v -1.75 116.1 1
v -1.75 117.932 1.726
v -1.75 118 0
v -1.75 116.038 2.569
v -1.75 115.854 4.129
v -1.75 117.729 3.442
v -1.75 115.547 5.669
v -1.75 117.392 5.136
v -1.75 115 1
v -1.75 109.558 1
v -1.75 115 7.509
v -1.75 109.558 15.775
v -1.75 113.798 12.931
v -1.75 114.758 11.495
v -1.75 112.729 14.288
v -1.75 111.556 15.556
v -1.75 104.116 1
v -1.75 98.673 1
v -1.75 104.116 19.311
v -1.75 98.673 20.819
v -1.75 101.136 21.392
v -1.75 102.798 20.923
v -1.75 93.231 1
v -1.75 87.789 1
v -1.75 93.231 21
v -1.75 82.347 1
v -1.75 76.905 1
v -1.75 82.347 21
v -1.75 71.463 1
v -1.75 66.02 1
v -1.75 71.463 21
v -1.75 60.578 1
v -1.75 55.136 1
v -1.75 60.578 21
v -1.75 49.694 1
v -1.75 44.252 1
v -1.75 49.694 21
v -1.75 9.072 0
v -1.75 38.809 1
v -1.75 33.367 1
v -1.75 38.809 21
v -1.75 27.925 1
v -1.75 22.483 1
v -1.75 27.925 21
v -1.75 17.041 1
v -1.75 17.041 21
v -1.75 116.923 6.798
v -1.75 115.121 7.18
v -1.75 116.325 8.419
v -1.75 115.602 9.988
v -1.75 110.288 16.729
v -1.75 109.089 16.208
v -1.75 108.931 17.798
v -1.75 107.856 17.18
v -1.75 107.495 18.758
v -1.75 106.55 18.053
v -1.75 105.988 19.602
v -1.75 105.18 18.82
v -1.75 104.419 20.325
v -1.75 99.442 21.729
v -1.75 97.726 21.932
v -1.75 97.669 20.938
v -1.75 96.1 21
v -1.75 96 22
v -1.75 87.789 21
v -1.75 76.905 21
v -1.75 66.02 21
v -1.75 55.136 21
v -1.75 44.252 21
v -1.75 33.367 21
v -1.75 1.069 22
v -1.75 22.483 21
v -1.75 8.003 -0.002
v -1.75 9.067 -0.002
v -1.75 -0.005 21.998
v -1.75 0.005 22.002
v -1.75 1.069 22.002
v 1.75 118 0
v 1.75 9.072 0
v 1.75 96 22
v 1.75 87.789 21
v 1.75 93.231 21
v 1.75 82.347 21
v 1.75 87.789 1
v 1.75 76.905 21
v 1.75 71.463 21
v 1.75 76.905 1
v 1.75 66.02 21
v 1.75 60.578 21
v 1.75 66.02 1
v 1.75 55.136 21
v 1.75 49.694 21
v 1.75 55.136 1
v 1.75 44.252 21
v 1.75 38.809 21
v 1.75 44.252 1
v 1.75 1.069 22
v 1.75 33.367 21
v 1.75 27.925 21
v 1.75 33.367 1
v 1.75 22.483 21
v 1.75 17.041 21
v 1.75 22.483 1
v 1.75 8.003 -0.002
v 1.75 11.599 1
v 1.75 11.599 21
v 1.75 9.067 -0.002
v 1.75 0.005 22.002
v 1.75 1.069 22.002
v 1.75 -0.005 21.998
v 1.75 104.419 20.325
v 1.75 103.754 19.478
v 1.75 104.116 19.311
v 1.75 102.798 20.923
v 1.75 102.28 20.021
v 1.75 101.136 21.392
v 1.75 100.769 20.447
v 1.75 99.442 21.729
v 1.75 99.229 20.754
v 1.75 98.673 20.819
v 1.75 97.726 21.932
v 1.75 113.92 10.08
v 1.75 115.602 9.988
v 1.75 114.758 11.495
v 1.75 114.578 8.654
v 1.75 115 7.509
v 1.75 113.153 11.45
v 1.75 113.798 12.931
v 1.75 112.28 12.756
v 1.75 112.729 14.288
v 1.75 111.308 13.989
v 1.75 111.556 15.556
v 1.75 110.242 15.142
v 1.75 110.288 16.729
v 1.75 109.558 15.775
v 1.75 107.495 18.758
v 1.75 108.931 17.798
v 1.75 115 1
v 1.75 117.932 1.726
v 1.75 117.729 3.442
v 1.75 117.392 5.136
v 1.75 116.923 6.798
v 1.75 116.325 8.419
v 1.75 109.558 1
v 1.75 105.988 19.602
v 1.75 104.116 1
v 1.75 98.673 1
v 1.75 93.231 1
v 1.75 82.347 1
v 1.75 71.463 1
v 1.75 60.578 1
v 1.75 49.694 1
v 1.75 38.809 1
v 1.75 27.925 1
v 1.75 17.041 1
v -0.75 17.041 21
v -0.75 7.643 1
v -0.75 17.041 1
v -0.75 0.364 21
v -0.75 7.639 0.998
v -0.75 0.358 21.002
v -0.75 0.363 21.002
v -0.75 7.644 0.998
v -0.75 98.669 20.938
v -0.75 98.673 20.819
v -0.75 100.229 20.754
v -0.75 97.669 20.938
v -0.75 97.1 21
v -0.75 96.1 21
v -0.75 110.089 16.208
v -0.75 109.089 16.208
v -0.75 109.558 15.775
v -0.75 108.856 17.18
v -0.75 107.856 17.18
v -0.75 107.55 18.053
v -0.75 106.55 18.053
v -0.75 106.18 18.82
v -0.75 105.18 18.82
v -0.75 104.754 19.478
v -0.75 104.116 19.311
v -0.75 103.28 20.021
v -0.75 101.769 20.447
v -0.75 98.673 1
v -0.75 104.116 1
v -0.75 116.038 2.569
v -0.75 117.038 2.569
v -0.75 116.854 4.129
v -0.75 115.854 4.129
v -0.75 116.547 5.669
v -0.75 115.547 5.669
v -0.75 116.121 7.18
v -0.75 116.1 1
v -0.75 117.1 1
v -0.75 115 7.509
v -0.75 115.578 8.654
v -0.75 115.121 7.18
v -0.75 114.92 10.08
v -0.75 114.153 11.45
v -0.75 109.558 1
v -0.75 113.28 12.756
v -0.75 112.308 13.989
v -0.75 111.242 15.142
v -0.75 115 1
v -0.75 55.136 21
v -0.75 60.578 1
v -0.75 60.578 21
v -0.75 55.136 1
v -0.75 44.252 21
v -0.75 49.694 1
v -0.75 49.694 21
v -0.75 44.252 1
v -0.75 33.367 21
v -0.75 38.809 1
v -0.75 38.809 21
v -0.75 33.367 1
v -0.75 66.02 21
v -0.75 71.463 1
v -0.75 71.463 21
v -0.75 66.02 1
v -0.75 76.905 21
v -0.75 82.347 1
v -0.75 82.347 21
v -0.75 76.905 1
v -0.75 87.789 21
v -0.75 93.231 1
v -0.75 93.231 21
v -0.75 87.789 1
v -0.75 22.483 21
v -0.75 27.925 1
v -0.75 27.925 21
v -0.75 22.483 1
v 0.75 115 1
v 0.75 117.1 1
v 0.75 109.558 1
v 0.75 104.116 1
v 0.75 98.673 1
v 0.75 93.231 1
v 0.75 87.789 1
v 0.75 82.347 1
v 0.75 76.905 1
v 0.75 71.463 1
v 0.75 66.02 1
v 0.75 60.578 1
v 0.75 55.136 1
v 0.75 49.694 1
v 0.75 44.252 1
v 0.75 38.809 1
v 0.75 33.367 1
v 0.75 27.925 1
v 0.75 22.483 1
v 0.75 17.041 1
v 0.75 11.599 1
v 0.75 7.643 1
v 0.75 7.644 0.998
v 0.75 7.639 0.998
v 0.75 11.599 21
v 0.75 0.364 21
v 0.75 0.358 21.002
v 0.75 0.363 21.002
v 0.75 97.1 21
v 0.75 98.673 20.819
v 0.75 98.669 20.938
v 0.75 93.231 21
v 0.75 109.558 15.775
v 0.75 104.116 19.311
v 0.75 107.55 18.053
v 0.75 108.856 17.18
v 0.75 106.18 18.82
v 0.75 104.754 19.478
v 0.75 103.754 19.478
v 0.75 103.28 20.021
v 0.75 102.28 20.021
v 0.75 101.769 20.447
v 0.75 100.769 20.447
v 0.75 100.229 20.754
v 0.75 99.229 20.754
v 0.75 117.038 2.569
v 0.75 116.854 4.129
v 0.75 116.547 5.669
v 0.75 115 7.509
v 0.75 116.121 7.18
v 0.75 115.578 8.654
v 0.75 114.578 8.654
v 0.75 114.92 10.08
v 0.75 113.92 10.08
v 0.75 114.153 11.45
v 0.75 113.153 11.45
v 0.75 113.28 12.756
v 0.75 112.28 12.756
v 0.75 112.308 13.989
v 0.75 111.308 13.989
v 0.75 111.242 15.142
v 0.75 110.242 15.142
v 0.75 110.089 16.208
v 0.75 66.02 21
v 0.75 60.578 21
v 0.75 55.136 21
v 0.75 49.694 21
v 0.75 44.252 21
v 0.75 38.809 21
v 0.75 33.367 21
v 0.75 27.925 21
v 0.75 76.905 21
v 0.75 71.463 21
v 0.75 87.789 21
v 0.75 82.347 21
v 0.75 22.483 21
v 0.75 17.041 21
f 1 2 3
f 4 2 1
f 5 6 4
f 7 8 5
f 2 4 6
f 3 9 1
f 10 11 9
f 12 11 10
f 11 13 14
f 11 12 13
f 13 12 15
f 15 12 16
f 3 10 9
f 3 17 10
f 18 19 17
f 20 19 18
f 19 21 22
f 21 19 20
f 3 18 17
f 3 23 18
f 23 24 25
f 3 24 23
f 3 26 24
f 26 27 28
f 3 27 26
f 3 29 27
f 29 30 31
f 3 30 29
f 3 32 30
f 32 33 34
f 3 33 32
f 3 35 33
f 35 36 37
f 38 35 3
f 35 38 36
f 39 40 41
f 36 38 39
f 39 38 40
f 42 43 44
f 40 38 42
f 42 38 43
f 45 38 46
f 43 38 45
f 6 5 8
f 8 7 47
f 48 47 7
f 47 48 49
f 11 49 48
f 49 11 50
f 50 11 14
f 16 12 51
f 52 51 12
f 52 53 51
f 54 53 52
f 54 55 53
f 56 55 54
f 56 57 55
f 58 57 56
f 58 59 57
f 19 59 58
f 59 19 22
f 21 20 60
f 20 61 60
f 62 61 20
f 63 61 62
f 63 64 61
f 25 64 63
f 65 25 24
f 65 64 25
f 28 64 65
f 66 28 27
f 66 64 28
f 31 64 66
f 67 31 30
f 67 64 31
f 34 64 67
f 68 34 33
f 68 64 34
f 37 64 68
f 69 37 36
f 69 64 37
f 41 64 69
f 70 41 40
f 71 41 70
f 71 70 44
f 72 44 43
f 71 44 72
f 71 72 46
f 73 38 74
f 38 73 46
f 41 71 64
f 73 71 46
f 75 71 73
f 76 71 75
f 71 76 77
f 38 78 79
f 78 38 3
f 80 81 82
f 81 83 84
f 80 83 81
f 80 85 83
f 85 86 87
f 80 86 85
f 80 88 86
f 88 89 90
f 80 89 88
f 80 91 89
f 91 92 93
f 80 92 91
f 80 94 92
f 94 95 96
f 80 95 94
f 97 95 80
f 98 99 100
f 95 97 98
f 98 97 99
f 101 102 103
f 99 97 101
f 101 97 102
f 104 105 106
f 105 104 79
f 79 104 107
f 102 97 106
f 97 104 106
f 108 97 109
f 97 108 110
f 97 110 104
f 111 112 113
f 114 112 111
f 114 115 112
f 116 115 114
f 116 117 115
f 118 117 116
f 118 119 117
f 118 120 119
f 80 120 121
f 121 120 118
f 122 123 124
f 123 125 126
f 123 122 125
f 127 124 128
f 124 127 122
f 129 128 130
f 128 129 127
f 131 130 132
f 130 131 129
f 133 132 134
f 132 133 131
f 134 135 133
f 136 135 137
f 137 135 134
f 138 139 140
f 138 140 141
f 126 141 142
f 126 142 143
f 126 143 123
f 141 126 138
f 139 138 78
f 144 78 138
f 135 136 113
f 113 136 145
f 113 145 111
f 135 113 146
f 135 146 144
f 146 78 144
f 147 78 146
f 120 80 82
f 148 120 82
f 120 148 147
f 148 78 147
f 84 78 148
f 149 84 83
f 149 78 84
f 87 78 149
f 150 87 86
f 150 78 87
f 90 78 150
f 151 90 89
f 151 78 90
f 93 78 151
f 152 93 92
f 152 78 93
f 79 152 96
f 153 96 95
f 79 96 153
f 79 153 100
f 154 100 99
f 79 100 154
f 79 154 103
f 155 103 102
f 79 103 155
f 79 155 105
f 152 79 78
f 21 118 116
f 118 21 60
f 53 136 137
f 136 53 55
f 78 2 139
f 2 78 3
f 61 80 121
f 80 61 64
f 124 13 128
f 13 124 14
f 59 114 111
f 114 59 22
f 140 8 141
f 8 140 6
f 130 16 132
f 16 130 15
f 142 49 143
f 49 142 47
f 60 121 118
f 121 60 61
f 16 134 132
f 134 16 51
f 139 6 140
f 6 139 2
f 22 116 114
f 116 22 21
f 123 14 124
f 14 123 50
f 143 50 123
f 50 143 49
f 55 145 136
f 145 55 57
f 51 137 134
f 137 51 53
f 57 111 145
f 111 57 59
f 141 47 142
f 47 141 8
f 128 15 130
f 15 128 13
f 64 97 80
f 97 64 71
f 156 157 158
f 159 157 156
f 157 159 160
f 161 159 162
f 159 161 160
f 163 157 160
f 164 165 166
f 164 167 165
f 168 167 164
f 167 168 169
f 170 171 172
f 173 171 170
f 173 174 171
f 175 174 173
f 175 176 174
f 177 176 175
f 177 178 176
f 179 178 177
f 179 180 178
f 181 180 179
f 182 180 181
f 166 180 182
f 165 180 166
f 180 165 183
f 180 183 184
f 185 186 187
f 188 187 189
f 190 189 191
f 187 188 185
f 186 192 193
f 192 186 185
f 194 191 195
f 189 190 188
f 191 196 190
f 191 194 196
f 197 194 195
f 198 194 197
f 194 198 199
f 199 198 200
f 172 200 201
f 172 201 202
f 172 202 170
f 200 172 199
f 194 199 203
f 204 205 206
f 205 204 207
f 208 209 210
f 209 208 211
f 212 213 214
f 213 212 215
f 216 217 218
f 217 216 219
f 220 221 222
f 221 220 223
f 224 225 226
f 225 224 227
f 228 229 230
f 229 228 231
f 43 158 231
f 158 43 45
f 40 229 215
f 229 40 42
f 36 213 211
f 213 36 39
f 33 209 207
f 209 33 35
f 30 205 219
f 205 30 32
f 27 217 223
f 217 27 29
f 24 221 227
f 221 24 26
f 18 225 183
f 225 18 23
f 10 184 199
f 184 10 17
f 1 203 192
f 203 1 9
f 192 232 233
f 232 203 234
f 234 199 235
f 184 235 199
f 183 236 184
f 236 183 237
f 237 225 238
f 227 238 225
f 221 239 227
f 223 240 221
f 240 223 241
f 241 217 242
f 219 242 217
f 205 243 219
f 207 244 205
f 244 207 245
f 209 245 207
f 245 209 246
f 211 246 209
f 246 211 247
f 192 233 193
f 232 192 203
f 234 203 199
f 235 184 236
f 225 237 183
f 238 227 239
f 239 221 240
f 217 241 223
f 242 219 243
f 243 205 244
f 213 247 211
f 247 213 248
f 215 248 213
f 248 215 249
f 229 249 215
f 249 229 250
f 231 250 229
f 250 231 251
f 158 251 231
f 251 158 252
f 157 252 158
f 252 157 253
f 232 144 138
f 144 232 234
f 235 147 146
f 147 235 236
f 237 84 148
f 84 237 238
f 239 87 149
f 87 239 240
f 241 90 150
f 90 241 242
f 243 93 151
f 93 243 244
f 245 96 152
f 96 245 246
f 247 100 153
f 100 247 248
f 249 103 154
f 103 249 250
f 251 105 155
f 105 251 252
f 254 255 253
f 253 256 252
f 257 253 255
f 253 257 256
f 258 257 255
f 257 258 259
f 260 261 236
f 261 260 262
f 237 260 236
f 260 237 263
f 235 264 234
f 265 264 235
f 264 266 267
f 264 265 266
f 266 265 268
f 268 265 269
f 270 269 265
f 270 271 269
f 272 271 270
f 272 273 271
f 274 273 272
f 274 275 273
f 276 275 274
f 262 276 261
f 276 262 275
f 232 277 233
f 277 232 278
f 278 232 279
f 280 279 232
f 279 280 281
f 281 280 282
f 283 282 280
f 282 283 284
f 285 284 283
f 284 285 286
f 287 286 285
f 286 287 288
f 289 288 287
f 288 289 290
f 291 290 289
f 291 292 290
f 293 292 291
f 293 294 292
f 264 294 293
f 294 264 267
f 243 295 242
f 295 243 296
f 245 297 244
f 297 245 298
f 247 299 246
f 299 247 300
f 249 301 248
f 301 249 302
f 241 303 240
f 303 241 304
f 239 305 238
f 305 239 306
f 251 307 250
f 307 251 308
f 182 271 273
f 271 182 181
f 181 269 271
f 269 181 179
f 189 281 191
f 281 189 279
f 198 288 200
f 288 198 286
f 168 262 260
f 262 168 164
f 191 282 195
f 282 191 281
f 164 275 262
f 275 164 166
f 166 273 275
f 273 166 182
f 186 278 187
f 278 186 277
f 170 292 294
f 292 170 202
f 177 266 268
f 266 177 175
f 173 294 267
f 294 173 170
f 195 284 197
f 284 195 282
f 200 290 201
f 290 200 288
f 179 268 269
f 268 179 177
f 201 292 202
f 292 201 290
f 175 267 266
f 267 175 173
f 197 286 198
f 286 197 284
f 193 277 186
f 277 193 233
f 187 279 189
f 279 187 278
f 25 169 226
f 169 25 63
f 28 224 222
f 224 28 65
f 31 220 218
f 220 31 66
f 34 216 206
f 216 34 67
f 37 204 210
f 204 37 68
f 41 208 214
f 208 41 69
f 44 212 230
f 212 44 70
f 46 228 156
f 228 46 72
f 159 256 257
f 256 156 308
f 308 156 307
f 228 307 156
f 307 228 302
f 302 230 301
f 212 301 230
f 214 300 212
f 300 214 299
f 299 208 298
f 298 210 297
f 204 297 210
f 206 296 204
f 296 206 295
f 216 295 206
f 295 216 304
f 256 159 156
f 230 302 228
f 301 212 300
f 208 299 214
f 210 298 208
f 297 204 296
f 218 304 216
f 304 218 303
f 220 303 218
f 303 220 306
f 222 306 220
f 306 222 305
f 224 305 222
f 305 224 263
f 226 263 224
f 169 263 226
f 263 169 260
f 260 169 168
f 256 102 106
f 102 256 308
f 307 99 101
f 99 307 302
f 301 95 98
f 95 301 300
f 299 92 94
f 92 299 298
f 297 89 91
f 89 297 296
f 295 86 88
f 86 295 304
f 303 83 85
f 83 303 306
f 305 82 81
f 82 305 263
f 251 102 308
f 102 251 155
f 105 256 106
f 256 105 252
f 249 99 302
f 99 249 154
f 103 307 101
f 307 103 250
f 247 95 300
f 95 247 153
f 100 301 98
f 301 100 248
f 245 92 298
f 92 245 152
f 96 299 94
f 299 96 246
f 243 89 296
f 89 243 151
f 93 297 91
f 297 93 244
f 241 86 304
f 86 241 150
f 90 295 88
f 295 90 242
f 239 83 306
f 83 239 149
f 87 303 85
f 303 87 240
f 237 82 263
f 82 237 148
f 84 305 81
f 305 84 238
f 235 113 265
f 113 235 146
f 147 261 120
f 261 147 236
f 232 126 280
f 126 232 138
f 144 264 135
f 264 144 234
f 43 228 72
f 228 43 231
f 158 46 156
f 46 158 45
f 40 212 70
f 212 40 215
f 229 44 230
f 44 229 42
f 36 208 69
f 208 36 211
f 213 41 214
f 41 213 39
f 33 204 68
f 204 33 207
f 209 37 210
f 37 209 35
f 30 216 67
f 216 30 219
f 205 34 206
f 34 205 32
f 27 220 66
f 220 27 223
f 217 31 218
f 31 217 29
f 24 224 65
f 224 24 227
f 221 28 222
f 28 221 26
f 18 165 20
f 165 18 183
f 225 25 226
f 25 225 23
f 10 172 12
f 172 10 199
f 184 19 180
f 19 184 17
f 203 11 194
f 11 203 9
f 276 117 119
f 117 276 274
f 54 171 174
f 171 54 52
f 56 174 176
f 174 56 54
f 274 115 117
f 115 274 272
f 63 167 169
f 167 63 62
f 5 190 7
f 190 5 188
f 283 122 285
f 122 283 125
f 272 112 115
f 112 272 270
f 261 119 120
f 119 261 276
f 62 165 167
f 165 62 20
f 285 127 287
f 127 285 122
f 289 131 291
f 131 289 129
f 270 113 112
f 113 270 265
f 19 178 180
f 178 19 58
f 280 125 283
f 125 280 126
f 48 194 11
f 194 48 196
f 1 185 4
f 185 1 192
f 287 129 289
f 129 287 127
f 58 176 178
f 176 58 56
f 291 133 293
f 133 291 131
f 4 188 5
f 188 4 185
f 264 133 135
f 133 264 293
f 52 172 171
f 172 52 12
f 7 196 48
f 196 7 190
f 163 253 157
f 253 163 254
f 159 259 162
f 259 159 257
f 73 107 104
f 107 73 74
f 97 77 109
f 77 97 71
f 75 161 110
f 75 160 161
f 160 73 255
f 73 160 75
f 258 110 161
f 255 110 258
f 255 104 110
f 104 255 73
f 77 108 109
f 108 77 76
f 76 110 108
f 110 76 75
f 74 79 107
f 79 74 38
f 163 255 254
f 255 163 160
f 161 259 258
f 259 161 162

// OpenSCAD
// parametric knife sheath
// original by Steve Pendergrast (vorpal)
// https://www.thingiverse.com/thing:125109
//
// remix v5.01 by BikeCyclist: Now supports negative grip cutoff angles 
// remix v4 by BikeCyclist: Bugfix for better walls with windows at high grip cutoff angles
// remix v3 by BikeCyclist: Bugfix (windows in thick walls) as suggested by Laurie, improved use of thingiverse customizer interface, better walls with windows at high grip cutoff angles
// remix v2 by BikeCyclist: Parametric wall thickness, shorter ridges, better symmetry
// remix v1 by BikeCyclist: Introducing holding ridge and oblique cut-off at grip
// https://www.thingiverse.com/thing:2856699

// length: the length of the blade from handle to tip
// maxwidth: the maximum width of the blade
// tipwidth:  the width near the tip, zero means it comes to a point
// thickness: maximum thickness of the blade
// has_windows:  0 = do not put in windows to show the blade and simplify cleaning
// has_ridges: 0 = do not add ridges to the sheath to hold the knife by friction
// grip_cutoff_angle:  the angle of the mouth of the sheet at the grip (off the vertical)
//
// all measurements are in mm

//CUSTOMIZER VARIABLES

//	Knife length, mm
knife_length = 115;	//	[25:350]

//	Knife Max Blade width, mm
knife_width = 18;	//	[10:100]

//	Knife thickness, mm
knife_thickness = 1.5;

//	Wall thickness, mm
wall_thickness = 0.5;

// Show knife through windows?
has_windows = 1; // [0:No, 1:Yes]

// Number of windows per side
number_of_windows = 10; // [1:25]

// Sheath has ridges to hold the knife more securely?
has_ridges = 0; // [0:No, 1:Yes]

// Angle of the sheath at the grip (0 = vertical) [-75:75]
grip_cutoff_angle = 20;

//CUSTOMIZER VARIABLES END

$fn = 80*1;  // while debugging reduce this to 20 to save time

wall = 2*wall_thickness;
pad = 2*1;

translate ([0, 0, knife_width + 2 * wall + pad])
    rotate ([0, 180, 0])
        parasheath (length = knife_length, maxwidth = knife_width, thickness = knife_thickness, windows = has_windows);


module parasheath(length=200, maxwidth=25, thickness=2, windows=1) 
{
    difference() 
    {
        union () 
        {            
            sheathwid = maxwidth + pad + 2 * wall;
            extralen = (grip_cutoff_angle<0?sheathwid * tan (-grip_cutoff_angle):0);
            sheathlen = length + wall + pad + extralen;

            translate ([0, -extralen, 0])
            difference() 
            {
                // first make an oversized blade, oversized by 2 times the wall thickness
                
                
                blade(len = sheathlen, maxwid = sheathwid, thick = thickness + 2 * wall);

                translate([0, 0, wall]) 
                blade(len = length + 0.1 + pad + extralen, maxwid = maxwidth + pad, thick = thickness);

            }
            
            if (has_ridges)
            for (i = [-1, 1])
                translate([0, 0, wall + knife_width/2 + pad/2]) 
                    translate ([i * knife_thickness/2, 0, 0])
                        rotate ([-90, 0, 0])
                            scale ([1, 2, 1])
                                cylinder (d = knife_thickness / 2, h = length/8);
            
        }
        
        if (windows)
            intersection ()
            {
                {
                    straight_length = length - maxwidth * sin (grip_cutoff_angle);
                    for (j = [-1, 1])
                        for (i = [1 : number_of_windows])
                            translate([j * (wall + thickness), maxwidth * sin (grip_cutoff_angle) + straight_length/number_of_windows * i + straight_length/(4 * number_of_windows) * j, maxwidth/2 + wall + pad/2]) 
                                    cube([2 * (wall + thickness), straight_length/(2 * number_of_windows), maxwidth + pad], center = true);
                }
                
                translate([0, 0, wall]) 
                    blade(len = length + 0.1 + pad - wall, maxwid = maxwidth + pad, thick = 2 * thickness + 4 * wall);
            }

        rotate ([-grip_cutoff_angle, 0, 0])
            translate([0, -1000, 0])
                    cube([2000,2000,2000], center=true);
    }
    
    /* Ensure windows don't cut through the mouth edges of the sheath */
    if (windows)
        difference ()
        {
            maxwid = maxwidth + pad + 2 * wall;
            
            hull ()
            {
                rotate ([-grip_cutoff_angle, 0, 0])
                    translate([0, 0, 0.5 * maxwid / cos (grip_cutoff_angle)])
                        cube ([thickness + 2 * wall, 0.01, maxwid / cos (grip_cutoff_angle)], center = true);
                
                translate([0, wall / cos (grip_cutoff_angle), 0])
                    rotate ([-grip_cutoff_angle, 0, 0])
                        translate([0, 0, 0.5 * maxwid / cos (grip_cutoff_angle)])
                            cube ([thickness + 2 * wall, 0.01, maxwid / cos (grip_cutoff_angle)], center = true);
            }
            
            hull ()
            {
                translate([0, -wall / cos (grip_cutoff_angle), 0])
                    rotate ([-grip_cutoff_angle, 0, 0])
                        translate([0, 0, 0.5 * maxwid / cos (grip_cutoff_angle)])
                            cube ([thickness, 0.01, (maxwidth + pad) / cos (grip_cutoff_angle)], center = true);
                
                translate([0, 2 * wall / cos (grip_cutoff_angle), 0])
                    rotate ([-grip_cutoff_angle, 0, 0])
                        translate([0, 0, 0.5 * maxwid / cos (grip_cutoff_angle)])
                            cube ([thickness, 0.01, (maxwidth + pad) / cos (grip_cutoff_angle)], center = true);
            }
        }
}

module blade (len = 200, maxwid = 25, tipwid = 5, thick = 2) 
{
    translate ([-thick/2, 0, 0])
        union() {
            intersection() {
                    // first make a cube
                    cube([thick, len, maxwid]);
        
                    translate([0,len-maxwid,maxwid]) 
                        rotate([0,90,0]) 
                            cylinder(r=maxwid,h=thick*3,center=true);
            }

            cube([thick,len-maxwid,maxwid]);
        }
}
